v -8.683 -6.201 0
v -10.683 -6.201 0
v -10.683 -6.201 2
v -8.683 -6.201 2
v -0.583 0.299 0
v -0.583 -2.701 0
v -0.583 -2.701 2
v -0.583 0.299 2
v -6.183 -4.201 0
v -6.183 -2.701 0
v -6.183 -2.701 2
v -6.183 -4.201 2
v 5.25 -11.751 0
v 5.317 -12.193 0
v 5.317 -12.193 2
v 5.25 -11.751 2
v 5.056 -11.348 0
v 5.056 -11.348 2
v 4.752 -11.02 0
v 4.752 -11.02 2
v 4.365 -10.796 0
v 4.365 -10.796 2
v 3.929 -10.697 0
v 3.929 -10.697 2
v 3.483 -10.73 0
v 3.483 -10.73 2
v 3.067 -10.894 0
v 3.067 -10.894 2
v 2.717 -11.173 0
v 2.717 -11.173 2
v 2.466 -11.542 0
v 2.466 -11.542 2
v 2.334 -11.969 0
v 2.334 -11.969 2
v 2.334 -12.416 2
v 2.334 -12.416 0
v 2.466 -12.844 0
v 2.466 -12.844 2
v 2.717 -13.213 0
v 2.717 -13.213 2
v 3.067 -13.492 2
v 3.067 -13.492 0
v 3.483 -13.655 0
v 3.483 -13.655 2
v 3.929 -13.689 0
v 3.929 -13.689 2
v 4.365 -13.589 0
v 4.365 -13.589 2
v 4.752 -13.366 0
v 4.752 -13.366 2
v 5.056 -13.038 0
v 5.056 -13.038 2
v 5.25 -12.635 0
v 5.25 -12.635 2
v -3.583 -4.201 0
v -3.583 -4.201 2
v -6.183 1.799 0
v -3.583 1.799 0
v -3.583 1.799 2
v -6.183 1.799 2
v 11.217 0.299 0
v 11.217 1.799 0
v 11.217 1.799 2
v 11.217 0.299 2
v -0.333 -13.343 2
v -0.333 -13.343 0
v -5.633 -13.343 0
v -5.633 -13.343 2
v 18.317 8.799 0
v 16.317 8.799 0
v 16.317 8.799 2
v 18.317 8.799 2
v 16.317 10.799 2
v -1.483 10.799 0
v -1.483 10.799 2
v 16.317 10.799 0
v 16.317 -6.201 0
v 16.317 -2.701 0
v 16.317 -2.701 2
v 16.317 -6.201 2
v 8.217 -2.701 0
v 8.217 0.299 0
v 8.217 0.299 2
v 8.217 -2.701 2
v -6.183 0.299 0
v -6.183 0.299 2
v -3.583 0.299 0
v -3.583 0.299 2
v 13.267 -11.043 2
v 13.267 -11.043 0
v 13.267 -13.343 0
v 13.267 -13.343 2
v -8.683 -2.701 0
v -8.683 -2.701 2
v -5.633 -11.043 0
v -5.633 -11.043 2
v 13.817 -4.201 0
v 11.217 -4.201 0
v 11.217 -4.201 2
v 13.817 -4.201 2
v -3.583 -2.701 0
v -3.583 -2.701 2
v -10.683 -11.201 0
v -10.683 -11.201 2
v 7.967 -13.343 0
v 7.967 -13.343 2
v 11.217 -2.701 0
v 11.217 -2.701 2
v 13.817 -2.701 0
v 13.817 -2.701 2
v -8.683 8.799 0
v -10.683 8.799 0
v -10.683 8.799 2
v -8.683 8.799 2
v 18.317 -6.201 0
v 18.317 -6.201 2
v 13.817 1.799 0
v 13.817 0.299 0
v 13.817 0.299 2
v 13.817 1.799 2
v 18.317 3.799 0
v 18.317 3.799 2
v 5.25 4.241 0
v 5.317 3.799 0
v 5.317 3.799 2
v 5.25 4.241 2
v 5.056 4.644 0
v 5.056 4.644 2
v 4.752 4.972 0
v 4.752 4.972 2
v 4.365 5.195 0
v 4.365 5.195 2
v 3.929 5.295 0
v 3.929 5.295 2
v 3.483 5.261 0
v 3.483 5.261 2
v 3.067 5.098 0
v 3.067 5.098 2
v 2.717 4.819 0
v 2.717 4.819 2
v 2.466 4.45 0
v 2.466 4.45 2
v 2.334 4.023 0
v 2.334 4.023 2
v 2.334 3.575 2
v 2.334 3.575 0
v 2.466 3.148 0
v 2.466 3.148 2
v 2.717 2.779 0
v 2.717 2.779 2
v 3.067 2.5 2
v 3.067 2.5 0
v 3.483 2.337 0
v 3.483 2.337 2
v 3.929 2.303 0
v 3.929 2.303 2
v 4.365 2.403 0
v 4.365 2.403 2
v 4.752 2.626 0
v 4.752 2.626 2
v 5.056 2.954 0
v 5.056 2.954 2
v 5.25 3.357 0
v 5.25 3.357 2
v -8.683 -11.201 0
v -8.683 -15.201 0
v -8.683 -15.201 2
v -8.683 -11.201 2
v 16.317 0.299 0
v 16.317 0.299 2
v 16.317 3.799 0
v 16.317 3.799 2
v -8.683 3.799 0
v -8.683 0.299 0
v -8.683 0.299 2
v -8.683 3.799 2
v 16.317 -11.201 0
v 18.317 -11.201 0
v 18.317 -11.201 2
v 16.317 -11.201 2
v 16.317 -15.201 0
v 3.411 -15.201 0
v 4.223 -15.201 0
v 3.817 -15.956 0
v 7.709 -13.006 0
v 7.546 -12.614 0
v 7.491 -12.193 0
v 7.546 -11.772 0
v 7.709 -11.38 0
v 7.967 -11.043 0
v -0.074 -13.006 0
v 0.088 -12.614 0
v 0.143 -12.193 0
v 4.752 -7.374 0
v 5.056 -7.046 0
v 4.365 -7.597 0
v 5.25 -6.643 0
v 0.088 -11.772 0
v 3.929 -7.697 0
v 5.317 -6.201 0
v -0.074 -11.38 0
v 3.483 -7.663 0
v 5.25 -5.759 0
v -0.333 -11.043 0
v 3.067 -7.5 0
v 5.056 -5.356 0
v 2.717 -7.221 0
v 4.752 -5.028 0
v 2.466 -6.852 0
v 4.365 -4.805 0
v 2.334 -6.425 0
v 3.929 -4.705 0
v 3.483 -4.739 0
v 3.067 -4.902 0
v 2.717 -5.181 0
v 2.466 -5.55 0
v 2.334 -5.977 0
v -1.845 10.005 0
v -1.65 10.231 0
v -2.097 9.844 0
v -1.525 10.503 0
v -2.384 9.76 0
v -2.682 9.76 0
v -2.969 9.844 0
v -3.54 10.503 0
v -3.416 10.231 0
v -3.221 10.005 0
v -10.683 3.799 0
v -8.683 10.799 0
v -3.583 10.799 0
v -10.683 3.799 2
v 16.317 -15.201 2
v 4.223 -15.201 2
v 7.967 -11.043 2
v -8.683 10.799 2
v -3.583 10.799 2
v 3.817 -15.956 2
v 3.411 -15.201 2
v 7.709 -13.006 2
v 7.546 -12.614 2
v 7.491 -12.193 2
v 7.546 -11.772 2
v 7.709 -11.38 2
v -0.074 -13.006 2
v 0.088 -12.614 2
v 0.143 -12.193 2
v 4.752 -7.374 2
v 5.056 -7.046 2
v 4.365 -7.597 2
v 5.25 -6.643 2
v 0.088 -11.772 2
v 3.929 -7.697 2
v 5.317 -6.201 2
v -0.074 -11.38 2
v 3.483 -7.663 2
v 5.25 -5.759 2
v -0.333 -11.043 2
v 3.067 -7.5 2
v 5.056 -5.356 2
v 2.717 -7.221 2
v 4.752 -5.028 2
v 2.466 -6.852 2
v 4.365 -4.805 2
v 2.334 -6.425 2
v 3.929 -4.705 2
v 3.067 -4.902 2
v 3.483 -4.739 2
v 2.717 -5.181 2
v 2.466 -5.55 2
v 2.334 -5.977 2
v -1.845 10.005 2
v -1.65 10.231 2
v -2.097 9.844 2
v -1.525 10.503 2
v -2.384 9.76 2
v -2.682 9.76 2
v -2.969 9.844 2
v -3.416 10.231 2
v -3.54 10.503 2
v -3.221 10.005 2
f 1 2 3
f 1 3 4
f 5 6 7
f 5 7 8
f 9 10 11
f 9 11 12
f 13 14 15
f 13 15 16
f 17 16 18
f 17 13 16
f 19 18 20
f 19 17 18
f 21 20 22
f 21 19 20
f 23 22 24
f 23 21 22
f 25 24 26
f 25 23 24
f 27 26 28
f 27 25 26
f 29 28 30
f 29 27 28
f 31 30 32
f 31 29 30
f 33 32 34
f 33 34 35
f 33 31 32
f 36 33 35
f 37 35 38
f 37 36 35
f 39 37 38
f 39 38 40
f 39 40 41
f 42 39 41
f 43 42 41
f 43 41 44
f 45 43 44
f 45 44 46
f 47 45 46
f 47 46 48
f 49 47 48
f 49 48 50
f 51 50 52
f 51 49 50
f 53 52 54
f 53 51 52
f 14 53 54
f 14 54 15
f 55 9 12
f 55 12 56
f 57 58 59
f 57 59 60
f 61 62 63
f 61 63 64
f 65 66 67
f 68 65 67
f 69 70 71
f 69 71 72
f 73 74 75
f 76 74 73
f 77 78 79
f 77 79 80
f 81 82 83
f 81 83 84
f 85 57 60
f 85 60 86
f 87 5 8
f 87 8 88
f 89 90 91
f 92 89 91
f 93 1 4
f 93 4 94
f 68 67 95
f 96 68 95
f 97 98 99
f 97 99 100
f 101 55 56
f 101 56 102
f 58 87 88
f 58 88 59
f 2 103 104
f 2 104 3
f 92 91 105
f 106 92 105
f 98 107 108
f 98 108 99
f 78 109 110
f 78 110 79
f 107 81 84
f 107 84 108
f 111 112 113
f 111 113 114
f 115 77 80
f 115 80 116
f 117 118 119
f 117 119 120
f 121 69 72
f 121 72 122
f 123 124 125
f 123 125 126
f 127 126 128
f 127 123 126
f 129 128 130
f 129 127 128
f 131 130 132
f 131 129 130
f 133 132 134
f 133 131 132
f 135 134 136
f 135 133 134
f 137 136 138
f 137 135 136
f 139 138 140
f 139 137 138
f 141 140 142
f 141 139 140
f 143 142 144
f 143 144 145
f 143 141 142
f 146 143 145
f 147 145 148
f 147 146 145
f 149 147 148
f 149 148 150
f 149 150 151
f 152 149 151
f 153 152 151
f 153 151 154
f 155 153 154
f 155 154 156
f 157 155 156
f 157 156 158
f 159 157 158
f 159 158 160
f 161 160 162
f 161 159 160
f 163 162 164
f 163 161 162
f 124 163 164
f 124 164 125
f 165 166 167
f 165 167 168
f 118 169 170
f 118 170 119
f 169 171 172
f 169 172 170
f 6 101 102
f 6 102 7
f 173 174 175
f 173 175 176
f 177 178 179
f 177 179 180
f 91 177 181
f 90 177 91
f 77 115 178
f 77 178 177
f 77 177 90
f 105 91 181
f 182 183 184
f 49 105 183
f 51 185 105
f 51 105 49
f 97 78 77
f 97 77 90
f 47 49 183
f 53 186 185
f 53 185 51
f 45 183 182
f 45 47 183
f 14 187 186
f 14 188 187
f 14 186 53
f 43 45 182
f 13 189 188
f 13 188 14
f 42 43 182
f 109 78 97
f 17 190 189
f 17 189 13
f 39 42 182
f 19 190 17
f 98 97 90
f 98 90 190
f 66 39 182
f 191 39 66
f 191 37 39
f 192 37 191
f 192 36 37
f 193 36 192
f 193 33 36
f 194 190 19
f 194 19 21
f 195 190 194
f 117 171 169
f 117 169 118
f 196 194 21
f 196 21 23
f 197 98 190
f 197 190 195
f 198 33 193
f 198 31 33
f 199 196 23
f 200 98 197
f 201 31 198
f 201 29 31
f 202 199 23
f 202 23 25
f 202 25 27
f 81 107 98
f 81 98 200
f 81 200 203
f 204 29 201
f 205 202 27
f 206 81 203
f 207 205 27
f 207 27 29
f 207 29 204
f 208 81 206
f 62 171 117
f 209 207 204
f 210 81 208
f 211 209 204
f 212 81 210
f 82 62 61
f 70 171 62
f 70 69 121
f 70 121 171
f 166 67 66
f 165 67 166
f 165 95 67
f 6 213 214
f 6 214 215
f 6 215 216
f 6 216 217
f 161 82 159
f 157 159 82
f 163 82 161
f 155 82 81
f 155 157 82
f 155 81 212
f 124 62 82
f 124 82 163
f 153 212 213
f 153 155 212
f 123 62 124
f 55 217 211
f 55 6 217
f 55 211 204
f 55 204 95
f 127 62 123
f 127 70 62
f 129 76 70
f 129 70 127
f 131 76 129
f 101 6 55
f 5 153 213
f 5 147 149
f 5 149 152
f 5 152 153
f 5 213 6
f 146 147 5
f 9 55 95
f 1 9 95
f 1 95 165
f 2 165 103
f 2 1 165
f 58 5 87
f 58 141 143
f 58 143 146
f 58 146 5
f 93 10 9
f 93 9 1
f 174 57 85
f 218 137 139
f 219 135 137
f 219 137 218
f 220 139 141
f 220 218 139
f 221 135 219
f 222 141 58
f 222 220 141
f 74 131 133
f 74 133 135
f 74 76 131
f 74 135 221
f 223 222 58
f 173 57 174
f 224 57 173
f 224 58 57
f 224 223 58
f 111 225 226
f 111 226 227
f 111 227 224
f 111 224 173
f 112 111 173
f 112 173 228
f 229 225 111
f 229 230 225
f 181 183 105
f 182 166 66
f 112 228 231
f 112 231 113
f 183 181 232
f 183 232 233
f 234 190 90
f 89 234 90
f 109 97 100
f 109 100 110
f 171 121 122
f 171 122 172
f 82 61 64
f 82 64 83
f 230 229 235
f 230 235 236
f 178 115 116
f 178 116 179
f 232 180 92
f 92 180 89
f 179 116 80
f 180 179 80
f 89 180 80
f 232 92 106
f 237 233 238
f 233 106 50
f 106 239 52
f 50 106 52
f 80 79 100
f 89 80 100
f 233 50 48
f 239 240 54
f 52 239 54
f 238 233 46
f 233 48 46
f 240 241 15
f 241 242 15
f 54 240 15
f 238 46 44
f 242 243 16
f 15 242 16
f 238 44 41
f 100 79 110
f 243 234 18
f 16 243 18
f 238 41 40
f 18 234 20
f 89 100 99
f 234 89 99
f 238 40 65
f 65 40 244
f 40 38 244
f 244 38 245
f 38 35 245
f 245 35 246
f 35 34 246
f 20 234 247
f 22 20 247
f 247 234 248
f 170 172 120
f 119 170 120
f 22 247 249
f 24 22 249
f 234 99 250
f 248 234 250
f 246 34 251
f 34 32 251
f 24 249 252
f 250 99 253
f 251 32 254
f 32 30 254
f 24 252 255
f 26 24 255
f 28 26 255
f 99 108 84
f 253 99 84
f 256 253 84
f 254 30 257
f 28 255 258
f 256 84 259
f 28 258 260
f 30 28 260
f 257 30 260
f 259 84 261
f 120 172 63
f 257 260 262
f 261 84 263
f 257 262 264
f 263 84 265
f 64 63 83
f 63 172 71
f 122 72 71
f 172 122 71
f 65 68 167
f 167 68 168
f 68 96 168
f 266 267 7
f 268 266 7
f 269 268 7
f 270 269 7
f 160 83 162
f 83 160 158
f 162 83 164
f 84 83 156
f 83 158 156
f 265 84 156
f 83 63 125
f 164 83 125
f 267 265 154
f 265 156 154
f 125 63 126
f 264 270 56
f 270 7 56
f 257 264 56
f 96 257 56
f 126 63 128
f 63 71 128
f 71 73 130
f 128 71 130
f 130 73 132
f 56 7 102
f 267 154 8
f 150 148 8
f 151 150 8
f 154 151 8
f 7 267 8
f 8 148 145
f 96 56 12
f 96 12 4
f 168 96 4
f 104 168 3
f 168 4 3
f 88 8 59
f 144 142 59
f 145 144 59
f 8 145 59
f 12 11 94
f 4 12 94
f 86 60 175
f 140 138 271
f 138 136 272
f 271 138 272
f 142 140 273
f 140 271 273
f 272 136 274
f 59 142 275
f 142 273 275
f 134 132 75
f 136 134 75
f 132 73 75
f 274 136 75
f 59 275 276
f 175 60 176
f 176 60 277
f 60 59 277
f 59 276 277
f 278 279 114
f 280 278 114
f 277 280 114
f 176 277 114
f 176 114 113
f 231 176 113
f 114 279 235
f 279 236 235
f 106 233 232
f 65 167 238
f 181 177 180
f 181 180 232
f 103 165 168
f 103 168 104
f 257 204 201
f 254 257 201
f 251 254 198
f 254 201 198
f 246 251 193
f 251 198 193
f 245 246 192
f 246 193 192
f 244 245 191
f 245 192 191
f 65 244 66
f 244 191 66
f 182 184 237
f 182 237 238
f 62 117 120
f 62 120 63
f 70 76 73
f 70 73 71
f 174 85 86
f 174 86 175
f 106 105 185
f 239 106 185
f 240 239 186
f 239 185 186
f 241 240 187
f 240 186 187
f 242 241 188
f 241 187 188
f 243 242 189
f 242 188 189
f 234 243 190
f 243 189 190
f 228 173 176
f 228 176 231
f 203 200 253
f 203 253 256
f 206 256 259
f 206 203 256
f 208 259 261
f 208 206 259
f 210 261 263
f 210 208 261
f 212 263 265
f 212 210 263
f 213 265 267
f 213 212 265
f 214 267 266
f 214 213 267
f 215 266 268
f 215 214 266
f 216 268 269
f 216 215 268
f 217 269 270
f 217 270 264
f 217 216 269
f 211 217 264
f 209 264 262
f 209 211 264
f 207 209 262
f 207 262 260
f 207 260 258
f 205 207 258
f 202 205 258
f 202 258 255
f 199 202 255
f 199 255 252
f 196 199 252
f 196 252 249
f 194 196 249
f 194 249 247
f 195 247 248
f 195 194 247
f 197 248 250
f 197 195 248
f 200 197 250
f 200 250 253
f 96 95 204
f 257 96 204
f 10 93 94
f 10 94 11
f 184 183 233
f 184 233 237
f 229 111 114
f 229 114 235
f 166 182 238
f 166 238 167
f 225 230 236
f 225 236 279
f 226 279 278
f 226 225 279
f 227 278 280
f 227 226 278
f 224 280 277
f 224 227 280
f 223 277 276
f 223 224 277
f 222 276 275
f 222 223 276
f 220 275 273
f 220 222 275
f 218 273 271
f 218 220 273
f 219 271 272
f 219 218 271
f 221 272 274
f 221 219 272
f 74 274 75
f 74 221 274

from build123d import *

# Parameters (mm, degrees)
SKETCH_1_R      = 1.5
EXTRUDE_1_DEPTH = 2


with BuildPart() as part:
    # 草图1 → 凸台-拉伸1 (new body)
    with BuildSketch(Plane.XY):
        with BuildLine():
            Line((-8.682938962, -11.200971973), (-10.682938962, -11.200971973))
            Line((-10.682938962, -11.200971973), (-10.682938962, -6.200971973))
            Line((-10.682938962, -6.200971973), (-8.682938962, -6.200971973))
            Line((-8.682938962, -6.200971973), (-8.682938962, -2.700971973))
            Line((-8.682938962, -2.700971973), (-6.182938962, -2.700971973))
            Line((-6.182938962, -2.700971973), (-6.182938962, -4.200971973))
            Line((-6.182938962, -4.200971973), (-3.582938962, -4.200971973))
            Line((-3.582938962, -4.200971973), (-3.582938962, -2.700971973))
            Line((-3.582938962, -2.700971973), (-0.582938962, -2.700971973))
            Line((-0.582938962, -2.700971973), (-0.582938962, 0.299028027))
            Line((-0.582938962, 0.299028027), (-3.582938962, 0.299028027))
            Line((-3.582938962, 0.299028027), (-3.582938962, 1.799028027))
            Line((-3.582938962, 1.799028027), (-6.182938962, 1.799028027))
            Line((-6.182938962, 1.799028027), (-6.182938962, 0.299028027))
            Line((-6.182938962, 0.299028027), (-8.682938962, 0.299028027))
            Line((-8.682938962, 0.299028027), (-8.682938962, 3.799028027))
            Line((-8.682938962, 3.799028027), (-10.682938962, 3.799028027))
            Line((-10.682938962, 3.799028027), (-10.682938962, 8.799028027))
            Line((-10.682938962, 8.799028027), (-8.682938962, 8.799028027))
            Line((-8.682938962, 8.799028027), (-8.682938962, 10.799028027))
            Line((-8.682938962, 10.799028027), (-3.582938962, 10.799028027))
            ThreePointArc((-3.582938962, 10.799028027), (-2.532938962, 9.749028027), (-1.482938962, 10.799028027))
            Line((-1.482938962, 10.799028027), (16.317061038, 10.799028027))
            Line((16.317061038, 10.799028027), (16.317061038, 8.799028027))
            Line((16.317061038, 8.799028027), (18.317061038, 8.799028027))
            Line((18.317061038, 8.799028027), (18.317061038, 3.799028027))
            Line((18.317061038, 3.799028027), (16.317061038, 3.799028027))
            Line((16.317061038, 3.799028027), (16.317061038, 0.299028027))
            Line((16.317061038, 0.299028027), (13.817061038, 0.299028027))
            Line((13.817061038, 0.299028027), (13.817061038, 1.799028027))
            Line((13.817061038, 1.799028027), (11.217061038, 1.799028027))
            Line((11.217061038, 1.799028027), (11.217061038, 0.299028027))
            Line((11.217061038, 0.299028027), (8.217061038, 0.299028027))
            Line((8.217061038, 0.299028027), (8.217061038, -2.700971973))
            Line((8.217061038, -2.700971973), (11.217061038, -2.700971973))
            Line((11.217061038, -2.700971973), (11.217061038, -4.200971973))
            Line((11.217061038, -4.200971973), (13.817061038, -4.200971973))
            Line((13.817061038, -4.200971973), (13.817061038, -2.700971973))
            Line((13.817061038, -2.700971973), (16.317061038, -2.700971973))
            Line((16.317061038, -2.700971973), (16.317061038, -6.200971973))
            Line((16.317061038, -6.200971973), (18.317061038, -6.200971973))
            Line((18.317061038, -6.200971973), (18.317061038, -11.200971973))
            Line((18.317061038, -11.200971973), (16.317061038, -11.200971973))
            Line((16.317061038, -11.200971973), (16.317061038, -15.200971973))
            Line((16.317061038, -15.200971973), (4.222987954, -15.200971973))
            Line((4.222987954, -15.200971973), (3.817061038, -15.955763704))
            Line((3.817061038, -15.955763704), (3.411134121, -15.200971973))
            Line((3.411134121, -15.200971973), (-8.682938962, -15.200971973))
            Line((-8.682938962, -15.200971973), (-8.682938962, -11.200971973))
        make_face()
        with Locations((3.817061038, -6.200971973)):
            Circle(SKETCH_1_R, mode=Mode.SUBTRACT)
        with Locations((3.817061038, 3.799028027)):
            Circle(SKETCH_1_R, mode=Mode.SUBTRACT)
        with Locations((3.817061038, -12.192801434)):
            Circle(SKETCH_1_R, mode=Mode.SUBTRACT)
        with BuildLine():
            Line((13.267061038, -13.342801434), (7.967061038, -13.342801434))
            ThreePointArc((7.967061038, -13.342801434), (7.490715441, -12.192801434), (7.967061038, -11.042801434))
            Line((7.967061038, -11.042801434), (13.267061038, -11.042801434))
            Line((13.267061038, -11.042801434), (13.267061038, -13.342801434))
        make_face(mode=Mode.SUBTRACT)
        with BuildLine():
            Line((-5.632938962, -11.042801434), (-0.332938962, -11.042801434))
            ThreePointArc((-0.332938962, -11.042801434), (0.143406634, -12.192801434), (-0.332938962, -13.342801434))
            Line((-0.332938962, -13.342801434), (-5.632938962, -13.342801434))
            Line((-5.632938962, -13.342801434), (-5.632938962, -11.042801434))
        make_face(mode=Mode.SUBTRACT)
    extrude(amount=EXTRUDE_1_DEPTH)


solid = part.part
